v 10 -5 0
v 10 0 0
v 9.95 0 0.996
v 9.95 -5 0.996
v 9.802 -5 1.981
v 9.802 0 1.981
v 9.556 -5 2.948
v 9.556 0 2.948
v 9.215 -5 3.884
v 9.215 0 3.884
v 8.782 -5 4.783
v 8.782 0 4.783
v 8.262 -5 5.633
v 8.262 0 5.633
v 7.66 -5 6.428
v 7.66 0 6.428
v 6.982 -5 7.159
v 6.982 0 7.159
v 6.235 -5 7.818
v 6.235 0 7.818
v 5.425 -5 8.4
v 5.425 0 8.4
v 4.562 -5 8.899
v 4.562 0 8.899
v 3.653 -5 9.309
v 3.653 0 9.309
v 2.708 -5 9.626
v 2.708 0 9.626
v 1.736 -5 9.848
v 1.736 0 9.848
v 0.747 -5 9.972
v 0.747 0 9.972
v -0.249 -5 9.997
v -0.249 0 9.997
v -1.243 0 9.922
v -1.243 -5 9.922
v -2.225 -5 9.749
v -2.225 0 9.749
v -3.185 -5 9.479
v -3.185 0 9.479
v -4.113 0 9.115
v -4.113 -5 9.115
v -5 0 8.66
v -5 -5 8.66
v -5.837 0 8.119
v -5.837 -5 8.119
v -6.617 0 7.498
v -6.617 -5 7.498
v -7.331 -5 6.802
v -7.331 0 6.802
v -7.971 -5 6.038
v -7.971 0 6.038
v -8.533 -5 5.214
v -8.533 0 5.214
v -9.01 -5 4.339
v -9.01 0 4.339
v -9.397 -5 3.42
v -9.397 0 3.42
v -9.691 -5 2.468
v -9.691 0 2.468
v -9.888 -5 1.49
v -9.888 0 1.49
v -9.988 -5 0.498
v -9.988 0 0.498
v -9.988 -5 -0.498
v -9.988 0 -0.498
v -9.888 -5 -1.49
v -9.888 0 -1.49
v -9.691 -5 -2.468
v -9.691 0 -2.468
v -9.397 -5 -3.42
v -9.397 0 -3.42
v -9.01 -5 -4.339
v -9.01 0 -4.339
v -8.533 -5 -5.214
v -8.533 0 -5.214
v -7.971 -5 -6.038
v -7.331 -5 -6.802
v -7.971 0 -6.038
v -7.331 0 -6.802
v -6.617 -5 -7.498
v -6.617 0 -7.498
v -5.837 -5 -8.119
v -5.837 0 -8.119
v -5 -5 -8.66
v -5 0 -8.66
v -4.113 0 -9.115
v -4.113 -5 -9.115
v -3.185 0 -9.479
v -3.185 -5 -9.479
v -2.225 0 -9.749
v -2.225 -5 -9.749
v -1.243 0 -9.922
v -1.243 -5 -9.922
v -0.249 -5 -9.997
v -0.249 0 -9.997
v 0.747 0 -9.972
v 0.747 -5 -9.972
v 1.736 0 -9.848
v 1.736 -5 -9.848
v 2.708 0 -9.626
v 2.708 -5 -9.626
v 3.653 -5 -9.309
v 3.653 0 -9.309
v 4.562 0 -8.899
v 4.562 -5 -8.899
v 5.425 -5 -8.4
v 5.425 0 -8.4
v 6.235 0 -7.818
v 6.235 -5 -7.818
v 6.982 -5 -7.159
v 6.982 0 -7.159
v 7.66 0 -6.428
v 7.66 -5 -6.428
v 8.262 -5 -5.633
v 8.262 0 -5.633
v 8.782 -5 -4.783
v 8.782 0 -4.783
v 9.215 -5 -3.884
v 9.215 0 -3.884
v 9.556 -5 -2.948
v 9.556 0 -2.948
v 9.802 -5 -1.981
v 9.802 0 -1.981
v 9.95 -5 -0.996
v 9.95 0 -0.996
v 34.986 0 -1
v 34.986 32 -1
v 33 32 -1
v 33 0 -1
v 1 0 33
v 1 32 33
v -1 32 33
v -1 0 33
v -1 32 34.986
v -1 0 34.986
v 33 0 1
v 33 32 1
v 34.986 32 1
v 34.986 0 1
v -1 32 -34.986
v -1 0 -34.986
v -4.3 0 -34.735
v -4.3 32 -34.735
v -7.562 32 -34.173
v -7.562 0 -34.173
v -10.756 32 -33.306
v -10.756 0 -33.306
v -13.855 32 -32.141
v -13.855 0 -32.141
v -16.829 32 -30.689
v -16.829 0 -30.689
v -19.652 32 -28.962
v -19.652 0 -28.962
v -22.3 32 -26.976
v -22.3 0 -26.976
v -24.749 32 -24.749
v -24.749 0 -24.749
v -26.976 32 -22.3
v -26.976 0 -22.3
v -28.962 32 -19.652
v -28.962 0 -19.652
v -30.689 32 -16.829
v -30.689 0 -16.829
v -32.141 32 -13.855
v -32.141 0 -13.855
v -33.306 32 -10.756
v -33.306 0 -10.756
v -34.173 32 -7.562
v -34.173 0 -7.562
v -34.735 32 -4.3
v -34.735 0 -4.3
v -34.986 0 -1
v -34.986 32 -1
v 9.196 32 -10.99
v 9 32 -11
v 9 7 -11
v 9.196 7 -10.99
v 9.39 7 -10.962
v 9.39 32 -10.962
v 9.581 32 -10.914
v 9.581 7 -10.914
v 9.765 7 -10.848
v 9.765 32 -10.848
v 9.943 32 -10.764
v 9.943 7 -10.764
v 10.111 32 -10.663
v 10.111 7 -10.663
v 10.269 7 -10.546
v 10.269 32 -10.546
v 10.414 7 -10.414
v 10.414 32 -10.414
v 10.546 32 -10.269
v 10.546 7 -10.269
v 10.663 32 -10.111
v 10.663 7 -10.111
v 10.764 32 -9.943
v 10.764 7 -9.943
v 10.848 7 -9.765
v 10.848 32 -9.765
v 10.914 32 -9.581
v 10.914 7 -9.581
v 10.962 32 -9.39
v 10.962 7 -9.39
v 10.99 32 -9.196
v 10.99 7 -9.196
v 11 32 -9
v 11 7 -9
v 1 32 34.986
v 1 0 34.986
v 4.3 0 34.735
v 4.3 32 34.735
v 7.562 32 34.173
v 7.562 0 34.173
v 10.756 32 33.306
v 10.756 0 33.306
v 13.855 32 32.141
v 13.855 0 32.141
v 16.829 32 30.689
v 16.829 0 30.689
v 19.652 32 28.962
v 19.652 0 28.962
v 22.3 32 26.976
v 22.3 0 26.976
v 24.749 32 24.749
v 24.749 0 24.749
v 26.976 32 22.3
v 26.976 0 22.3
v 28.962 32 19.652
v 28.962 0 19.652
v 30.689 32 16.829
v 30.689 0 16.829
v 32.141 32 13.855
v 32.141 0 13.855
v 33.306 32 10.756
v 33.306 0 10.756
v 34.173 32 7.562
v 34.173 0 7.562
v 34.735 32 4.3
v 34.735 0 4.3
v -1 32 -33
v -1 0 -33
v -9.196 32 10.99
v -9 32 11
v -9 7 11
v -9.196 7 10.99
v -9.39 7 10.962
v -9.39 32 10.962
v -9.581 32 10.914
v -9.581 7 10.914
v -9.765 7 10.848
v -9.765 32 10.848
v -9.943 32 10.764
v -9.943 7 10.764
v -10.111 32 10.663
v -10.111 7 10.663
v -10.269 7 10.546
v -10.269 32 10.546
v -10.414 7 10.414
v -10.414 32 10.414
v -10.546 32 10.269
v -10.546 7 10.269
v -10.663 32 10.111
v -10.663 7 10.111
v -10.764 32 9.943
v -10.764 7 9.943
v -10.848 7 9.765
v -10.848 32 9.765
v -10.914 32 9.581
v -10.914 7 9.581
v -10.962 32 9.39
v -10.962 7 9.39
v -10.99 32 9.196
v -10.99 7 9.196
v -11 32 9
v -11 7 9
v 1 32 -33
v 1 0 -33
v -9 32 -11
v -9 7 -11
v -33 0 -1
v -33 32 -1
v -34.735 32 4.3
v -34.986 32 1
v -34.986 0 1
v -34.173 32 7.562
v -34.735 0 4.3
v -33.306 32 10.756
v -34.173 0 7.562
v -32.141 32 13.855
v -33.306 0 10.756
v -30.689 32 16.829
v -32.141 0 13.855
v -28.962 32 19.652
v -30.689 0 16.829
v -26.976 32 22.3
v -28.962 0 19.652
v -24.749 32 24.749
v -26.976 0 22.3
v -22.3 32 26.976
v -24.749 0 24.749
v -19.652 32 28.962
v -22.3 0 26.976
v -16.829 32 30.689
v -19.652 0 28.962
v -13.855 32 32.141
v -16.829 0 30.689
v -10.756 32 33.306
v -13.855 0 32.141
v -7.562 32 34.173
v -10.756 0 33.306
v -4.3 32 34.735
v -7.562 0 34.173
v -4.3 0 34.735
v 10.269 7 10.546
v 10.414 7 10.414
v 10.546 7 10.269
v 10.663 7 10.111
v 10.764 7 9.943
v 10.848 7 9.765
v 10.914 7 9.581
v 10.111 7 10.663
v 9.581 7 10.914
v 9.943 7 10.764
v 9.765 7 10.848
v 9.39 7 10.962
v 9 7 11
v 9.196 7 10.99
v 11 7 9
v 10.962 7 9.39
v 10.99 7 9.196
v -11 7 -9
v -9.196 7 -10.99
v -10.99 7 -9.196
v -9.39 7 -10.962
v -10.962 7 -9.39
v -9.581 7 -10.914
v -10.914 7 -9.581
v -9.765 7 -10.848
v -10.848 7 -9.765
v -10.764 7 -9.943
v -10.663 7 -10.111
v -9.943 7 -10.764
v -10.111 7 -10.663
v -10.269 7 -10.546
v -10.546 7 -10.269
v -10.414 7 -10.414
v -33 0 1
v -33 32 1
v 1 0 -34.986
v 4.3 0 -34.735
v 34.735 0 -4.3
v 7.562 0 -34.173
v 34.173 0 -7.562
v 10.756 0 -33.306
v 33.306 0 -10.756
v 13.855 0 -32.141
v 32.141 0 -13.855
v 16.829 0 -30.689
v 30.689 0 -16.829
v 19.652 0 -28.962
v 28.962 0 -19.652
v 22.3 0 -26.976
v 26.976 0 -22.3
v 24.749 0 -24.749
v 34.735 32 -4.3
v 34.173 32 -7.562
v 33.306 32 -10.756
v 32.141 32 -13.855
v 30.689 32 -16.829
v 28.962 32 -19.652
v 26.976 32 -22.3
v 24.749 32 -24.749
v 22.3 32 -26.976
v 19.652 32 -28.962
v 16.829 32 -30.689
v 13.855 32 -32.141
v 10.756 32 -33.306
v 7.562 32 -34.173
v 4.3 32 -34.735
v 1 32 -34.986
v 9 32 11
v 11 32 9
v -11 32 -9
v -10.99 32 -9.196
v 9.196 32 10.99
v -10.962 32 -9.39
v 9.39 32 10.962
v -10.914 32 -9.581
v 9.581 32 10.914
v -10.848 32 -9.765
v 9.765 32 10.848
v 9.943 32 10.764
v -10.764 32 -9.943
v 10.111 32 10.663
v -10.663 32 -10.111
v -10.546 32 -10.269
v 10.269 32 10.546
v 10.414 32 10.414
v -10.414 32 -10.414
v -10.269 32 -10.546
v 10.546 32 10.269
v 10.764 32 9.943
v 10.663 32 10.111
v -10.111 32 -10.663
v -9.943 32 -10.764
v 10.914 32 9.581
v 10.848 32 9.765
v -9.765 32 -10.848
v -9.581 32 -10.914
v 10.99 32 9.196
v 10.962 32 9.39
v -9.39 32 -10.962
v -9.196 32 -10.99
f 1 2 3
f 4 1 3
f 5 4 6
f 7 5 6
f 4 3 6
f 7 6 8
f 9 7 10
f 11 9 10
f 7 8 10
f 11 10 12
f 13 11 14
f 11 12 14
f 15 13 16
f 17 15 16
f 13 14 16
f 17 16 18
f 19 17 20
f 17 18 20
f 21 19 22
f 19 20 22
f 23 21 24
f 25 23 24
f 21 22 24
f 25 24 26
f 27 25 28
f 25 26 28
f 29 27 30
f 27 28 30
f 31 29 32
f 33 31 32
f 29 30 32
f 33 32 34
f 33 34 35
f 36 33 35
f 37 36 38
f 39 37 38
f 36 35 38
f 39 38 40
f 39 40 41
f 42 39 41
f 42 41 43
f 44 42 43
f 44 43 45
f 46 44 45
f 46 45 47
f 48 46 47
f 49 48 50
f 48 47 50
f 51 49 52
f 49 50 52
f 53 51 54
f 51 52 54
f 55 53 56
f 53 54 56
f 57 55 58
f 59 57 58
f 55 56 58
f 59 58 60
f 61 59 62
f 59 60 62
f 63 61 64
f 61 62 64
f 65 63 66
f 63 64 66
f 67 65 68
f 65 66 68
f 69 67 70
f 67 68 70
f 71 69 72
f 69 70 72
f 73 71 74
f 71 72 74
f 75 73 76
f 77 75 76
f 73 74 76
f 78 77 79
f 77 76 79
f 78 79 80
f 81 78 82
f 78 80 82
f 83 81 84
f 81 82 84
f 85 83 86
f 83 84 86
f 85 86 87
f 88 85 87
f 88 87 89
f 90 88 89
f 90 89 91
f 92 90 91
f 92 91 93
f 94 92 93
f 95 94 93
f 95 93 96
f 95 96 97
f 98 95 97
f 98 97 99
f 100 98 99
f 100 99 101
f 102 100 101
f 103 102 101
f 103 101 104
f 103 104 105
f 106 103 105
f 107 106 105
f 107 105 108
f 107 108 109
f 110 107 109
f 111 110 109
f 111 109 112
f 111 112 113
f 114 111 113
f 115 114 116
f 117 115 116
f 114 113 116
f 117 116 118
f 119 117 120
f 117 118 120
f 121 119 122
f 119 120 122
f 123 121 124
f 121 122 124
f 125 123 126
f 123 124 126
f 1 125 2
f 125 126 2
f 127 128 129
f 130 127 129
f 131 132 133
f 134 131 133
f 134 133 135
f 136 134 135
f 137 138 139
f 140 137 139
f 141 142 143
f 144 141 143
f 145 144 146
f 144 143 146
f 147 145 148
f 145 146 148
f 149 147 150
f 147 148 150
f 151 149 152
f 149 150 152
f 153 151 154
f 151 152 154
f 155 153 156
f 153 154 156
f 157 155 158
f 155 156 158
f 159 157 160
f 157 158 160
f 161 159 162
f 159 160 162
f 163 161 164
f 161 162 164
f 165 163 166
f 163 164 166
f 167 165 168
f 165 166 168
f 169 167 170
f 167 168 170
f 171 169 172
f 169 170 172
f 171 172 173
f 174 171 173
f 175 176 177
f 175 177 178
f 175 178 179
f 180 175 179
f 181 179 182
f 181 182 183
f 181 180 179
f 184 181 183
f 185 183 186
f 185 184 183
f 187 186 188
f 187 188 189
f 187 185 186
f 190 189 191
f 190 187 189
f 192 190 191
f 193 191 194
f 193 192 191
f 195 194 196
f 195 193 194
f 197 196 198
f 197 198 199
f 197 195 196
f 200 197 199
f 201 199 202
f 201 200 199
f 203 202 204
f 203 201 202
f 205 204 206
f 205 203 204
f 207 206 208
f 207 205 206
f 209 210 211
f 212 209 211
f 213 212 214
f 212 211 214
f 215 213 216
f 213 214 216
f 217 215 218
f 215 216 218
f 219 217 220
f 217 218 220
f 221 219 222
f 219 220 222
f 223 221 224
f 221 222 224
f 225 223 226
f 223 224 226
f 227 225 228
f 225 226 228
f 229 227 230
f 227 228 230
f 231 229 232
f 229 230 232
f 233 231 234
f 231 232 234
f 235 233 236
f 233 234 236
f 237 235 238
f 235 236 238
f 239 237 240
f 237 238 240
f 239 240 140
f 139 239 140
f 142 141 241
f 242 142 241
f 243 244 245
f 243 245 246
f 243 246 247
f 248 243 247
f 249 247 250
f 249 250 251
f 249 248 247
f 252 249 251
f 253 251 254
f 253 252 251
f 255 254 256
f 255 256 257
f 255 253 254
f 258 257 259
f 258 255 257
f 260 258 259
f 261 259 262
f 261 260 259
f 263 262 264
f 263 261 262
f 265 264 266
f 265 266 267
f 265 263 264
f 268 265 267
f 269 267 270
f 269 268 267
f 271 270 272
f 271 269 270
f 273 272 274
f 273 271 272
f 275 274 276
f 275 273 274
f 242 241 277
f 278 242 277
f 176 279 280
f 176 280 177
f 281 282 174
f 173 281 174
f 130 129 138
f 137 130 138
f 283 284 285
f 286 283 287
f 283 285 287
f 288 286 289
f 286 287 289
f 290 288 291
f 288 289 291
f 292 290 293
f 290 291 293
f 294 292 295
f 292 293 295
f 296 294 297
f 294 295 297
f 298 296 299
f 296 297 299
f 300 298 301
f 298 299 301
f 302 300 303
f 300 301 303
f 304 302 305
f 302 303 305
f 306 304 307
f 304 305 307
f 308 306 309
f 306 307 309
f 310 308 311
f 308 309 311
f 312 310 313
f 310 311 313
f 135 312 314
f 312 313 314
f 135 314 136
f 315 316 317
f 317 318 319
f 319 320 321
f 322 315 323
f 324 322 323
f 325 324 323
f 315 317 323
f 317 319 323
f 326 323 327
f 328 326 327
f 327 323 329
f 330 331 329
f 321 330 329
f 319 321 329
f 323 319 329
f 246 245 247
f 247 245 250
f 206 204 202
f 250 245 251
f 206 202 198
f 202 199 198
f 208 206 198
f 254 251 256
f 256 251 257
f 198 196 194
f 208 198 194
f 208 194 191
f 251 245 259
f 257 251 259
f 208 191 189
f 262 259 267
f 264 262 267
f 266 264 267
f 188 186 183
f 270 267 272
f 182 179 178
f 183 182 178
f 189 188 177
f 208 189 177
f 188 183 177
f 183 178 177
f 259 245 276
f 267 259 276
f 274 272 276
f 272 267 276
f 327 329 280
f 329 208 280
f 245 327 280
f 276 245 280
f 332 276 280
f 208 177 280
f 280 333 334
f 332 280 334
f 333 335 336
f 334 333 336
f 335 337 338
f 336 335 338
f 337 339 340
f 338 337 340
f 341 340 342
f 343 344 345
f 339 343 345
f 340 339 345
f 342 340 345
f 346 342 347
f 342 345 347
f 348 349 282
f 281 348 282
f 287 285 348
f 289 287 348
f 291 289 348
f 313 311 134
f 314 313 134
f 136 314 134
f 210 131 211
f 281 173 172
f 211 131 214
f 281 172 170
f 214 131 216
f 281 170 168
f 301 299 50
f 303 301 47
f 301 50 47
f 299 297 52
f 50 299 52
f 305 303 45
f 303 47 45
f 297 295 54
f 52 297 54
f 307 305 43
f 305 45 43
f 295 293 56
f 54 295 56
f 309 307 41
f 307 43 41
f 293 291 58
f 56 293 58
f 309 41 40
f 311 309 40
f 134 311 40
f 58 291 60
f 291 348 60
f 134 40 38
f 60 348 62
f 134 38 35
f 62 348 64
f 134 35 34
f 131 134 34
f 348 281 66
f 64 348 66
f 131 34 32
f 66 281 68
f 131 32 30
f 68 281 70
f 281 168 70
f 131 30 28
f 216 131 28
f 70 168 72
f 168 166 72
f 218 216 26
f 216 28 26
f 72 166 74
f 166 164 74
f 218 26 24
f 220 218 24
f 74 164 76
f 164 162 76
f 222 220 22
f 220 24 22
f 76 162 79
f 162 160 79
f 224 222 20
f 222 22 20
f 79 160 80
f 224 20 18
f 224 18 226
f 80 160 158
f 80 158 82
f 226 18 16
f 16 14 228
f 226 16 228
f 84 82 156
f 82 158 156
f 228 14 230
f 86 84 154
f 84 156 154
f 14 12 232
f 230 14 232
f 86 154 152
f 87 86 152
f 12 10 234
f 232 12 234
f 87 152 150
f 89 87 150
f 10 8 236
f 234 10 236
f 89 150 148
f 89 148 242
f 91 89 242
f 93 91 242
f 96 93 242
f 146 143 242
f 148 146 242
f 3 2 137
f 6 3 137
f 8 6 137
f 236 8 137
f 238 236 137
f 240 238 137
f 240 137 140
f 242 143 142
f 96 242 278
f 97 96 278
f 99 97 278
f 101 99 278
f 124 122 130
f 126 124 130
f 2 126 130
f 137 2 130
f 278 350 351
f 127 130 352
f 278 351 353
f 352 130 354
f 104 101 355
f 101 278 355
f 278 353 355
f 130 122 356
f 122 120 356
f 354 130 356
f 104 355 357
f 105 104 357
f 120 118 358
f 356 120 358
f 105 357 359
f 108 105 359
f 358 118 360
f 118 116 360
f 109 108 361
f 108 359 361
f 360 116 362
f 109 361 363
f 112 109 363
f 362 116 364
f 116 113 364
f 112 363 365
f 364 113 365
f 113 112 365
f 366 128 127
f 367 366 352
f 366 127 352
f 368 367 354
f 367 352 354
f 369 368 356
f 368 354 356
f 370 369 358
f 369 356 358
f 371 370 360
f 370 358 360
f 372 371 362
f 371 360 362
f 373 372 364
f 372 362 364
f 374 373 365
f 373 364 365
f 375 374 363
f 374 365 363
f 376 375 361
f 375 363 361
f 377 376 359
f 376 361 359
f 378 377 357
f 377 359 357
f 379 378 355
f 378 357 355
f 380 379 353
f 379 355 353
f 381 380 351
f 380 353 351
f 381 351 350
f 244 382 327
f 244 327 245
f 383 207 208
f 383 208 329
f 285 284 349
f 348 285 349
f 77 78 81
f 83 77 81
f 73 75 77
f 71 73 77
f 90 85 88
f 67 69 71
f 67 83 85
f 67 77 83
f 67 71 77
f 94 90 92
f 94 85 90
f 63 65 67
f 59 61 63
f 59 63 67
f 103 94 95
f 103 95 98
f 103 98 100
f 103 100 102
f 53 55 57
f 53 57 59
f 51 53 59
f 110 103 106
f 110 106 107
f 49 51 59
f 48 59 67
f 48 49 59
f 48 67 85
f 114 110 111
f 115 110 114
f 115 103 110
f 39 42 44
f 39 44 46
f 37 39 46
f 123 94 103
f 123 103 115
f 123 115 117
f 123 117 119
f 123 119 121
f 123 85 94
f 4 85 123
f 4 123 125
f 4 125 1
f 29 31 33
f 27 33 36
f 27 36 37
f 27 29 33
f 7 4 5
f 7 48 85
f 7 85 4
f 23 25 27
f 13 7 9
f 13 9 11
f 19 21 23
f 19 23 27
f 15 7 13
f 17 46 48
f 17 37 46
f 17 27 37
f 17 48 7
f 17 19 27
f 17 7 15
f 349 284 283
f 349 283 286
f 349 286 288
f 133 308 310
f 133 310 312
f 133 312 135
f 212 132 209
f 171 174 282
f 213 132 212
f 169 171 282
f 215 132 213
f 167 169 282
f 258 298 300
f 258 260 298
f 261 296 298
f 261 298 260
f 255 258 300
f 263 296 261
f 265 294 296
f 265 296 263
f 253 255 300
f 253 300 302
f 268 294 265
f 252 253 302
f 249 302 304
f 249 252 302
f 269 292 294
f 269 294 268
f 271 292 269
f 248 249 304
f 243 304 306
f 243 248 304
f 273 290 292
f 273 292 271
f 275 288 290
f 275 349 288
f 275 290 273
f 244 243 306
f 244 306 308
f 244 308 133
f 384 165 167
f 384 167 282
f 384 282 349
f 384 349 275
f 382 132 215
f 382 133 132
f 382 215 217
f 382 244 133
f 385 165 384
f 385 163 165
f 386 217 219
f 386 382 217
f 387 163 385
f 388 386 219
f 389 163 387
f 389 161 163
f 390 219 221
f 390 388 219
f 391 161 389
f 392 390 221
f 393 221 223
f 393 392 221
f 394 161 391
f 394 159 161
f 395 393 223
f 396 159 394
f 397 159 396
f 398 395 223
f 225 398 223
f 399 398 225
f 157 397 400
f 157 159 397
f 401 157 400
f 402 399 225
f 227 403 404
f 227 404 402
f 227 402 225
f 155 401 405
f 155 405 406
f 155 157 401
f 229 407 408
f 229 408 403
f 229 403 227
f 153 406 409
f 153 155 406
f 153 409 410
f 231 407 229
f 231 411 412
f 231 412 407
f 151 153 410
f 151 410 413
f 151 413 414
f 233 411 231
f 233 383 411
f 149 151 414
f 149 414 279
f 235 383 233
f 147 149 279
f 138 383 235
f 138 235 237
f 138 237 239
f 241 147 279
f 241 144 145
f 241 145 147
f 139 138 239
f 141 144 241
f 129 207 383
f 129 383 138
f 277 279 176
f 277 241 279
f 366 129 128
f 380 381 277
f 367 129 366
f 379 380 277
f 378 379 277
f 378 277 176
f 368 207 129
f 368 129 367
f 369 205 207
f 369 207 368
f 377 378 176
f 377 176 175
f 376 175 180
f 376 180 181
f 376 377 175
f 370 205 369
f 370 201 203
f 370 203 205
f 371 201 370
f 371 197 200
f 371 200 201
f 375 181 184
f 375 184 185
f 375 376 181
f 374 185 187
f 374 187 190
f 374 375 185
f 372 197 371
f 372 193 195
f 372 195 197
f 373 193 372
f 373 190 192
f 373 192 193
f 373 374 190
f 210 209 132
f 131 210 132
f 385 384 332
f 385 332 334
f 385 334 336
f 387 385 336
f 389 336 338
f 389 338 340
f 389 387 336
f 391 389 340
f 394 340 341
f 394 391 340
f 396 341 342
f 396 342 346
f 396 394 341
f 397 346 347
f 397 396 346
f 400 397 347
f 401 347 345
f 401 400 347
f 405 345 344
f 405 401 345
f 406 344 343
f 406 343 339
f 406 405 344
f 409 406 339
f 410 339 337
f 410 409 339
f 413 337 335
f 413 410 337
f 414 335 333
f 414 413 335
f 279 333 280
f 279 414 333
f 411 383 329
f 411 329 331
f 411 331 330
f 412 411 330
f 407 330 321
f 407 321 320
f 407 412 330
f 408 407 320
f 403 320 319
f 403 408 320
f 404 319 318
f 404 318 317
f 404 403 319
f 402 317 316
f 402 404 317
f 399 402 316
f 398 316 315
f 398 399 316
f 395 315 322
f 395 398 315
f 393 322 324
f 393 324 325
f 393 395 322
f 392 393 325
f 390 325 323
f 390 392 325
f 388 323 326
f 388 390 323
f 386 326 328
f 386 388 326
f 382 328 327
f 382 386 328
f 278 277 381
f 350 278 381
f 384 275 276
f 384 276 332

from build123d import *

# Parameters (mm, degrees)
SKETCH1_R           = 35
BOSS_EXTRUDE1_DEPTH = 32
SKETCH2_R           = 10
BOSS_EXTRUDE2_DEPTH = 5
CUT_EXTRUDE1_DEPTH  = 25
CUT_EXTRUDE2_DEPTH  = 36


with BuildPart() as part:
    # Sketch1 → Boss-Extrude1 (new body)
    with BuildSketch(Plane(origin=(0, 0, 0), x_dir=(1, 0, 0), z_dir=(0, 1, 0))):
        Circle(SKETCH1_R)
    extrude(amount=BOSS_EXTRUDE1_DEPTH)

    # Sketch2 → Boss-Extrude2 (add)
    with BuildSketch(Plane.XZ):
        Circle(SKETCH2_R)
    extrude(amount=BOSS_EXTRUDE2_DEPTH)

    # Sketch3 → Cut-Extrude1 (cut)
    with BuildSketch(Plane(origin=(0, 32, 0), x_dir=(1, 0, 0), z_dir=(0, 1, 0))):
        with BuildLine():
            Line((-9, 11), (9, 11))
            ThreePointArc((9, 11), (10.414213562, 10.414213562), (11, 9))
            Line((11, 9), (11, -9))
            ThreePointArc((11, -9), (10.414213562, -10.414213562), (9, -11))
            Line((9, -11), (-9, -11))
            ThreePointArc((-9, -11), (-10.414213562, -10.414213562), (-11, -9))
            Line((-11, -9), (-11, 9))
            ThreePointArc((-11, 9), (-10.414213562, 10.414213562), (-9, 11))
        make_face()
    extrude(amount=-CUT_EXTRUDE1_DEPTH, mode=Mode.SUBTRACT)

    # Sketch4 → Cut-Extrude2 (cut)
    with BuildSketch(Plane(origin=(0, 32, 0), x_dir=(1, 0, 0), z_dir=(0, 1, 0))):
        with BuildLine():
            Line((-1, 34.985711369), (-1, 33))
            Line((-1, 33), (1, 33))
            Line((1, 33), (1, 34.985711369))
            ThreePointArc((1, 34.985711369), (0, 35), (-1, 34.985711369))
        make_face()
        with BuildLine():
            Line((34.985711369, 1), (33, 1))
            Line((33, 1), (33, -1))
            Line((33, -1), (34.985711369, -1))
            ThreePointArc((34.985711369, -1), (35, 0), (34.985711369, 1))
        make_face()
        with BuildLine():
            Line((1, -34.985711369), (1, -33))
            Line((1, -33), (-1, -33))
            Line((-1, -33), (-1, -34.985711369))
            ThreePointArc((-1, -34.985711369), (0, -35), (1, -34.985711369))
        make_face()
        with BuildLine():
            Line((-34.985711369, -1), (-33, -1))
            Line((-33, -1), (-33, 1))
            Line((-33, 1), (-34.985711369, 1))
            ThreePointArc((-34.985711369, 1), (-35, 0), (-34.985711369, -1))
        make_face()
    extrude(amount=-CUT_EXTRUDE2_DEPTH, mode=Mode.SUBTRACT)


solid = part.part
